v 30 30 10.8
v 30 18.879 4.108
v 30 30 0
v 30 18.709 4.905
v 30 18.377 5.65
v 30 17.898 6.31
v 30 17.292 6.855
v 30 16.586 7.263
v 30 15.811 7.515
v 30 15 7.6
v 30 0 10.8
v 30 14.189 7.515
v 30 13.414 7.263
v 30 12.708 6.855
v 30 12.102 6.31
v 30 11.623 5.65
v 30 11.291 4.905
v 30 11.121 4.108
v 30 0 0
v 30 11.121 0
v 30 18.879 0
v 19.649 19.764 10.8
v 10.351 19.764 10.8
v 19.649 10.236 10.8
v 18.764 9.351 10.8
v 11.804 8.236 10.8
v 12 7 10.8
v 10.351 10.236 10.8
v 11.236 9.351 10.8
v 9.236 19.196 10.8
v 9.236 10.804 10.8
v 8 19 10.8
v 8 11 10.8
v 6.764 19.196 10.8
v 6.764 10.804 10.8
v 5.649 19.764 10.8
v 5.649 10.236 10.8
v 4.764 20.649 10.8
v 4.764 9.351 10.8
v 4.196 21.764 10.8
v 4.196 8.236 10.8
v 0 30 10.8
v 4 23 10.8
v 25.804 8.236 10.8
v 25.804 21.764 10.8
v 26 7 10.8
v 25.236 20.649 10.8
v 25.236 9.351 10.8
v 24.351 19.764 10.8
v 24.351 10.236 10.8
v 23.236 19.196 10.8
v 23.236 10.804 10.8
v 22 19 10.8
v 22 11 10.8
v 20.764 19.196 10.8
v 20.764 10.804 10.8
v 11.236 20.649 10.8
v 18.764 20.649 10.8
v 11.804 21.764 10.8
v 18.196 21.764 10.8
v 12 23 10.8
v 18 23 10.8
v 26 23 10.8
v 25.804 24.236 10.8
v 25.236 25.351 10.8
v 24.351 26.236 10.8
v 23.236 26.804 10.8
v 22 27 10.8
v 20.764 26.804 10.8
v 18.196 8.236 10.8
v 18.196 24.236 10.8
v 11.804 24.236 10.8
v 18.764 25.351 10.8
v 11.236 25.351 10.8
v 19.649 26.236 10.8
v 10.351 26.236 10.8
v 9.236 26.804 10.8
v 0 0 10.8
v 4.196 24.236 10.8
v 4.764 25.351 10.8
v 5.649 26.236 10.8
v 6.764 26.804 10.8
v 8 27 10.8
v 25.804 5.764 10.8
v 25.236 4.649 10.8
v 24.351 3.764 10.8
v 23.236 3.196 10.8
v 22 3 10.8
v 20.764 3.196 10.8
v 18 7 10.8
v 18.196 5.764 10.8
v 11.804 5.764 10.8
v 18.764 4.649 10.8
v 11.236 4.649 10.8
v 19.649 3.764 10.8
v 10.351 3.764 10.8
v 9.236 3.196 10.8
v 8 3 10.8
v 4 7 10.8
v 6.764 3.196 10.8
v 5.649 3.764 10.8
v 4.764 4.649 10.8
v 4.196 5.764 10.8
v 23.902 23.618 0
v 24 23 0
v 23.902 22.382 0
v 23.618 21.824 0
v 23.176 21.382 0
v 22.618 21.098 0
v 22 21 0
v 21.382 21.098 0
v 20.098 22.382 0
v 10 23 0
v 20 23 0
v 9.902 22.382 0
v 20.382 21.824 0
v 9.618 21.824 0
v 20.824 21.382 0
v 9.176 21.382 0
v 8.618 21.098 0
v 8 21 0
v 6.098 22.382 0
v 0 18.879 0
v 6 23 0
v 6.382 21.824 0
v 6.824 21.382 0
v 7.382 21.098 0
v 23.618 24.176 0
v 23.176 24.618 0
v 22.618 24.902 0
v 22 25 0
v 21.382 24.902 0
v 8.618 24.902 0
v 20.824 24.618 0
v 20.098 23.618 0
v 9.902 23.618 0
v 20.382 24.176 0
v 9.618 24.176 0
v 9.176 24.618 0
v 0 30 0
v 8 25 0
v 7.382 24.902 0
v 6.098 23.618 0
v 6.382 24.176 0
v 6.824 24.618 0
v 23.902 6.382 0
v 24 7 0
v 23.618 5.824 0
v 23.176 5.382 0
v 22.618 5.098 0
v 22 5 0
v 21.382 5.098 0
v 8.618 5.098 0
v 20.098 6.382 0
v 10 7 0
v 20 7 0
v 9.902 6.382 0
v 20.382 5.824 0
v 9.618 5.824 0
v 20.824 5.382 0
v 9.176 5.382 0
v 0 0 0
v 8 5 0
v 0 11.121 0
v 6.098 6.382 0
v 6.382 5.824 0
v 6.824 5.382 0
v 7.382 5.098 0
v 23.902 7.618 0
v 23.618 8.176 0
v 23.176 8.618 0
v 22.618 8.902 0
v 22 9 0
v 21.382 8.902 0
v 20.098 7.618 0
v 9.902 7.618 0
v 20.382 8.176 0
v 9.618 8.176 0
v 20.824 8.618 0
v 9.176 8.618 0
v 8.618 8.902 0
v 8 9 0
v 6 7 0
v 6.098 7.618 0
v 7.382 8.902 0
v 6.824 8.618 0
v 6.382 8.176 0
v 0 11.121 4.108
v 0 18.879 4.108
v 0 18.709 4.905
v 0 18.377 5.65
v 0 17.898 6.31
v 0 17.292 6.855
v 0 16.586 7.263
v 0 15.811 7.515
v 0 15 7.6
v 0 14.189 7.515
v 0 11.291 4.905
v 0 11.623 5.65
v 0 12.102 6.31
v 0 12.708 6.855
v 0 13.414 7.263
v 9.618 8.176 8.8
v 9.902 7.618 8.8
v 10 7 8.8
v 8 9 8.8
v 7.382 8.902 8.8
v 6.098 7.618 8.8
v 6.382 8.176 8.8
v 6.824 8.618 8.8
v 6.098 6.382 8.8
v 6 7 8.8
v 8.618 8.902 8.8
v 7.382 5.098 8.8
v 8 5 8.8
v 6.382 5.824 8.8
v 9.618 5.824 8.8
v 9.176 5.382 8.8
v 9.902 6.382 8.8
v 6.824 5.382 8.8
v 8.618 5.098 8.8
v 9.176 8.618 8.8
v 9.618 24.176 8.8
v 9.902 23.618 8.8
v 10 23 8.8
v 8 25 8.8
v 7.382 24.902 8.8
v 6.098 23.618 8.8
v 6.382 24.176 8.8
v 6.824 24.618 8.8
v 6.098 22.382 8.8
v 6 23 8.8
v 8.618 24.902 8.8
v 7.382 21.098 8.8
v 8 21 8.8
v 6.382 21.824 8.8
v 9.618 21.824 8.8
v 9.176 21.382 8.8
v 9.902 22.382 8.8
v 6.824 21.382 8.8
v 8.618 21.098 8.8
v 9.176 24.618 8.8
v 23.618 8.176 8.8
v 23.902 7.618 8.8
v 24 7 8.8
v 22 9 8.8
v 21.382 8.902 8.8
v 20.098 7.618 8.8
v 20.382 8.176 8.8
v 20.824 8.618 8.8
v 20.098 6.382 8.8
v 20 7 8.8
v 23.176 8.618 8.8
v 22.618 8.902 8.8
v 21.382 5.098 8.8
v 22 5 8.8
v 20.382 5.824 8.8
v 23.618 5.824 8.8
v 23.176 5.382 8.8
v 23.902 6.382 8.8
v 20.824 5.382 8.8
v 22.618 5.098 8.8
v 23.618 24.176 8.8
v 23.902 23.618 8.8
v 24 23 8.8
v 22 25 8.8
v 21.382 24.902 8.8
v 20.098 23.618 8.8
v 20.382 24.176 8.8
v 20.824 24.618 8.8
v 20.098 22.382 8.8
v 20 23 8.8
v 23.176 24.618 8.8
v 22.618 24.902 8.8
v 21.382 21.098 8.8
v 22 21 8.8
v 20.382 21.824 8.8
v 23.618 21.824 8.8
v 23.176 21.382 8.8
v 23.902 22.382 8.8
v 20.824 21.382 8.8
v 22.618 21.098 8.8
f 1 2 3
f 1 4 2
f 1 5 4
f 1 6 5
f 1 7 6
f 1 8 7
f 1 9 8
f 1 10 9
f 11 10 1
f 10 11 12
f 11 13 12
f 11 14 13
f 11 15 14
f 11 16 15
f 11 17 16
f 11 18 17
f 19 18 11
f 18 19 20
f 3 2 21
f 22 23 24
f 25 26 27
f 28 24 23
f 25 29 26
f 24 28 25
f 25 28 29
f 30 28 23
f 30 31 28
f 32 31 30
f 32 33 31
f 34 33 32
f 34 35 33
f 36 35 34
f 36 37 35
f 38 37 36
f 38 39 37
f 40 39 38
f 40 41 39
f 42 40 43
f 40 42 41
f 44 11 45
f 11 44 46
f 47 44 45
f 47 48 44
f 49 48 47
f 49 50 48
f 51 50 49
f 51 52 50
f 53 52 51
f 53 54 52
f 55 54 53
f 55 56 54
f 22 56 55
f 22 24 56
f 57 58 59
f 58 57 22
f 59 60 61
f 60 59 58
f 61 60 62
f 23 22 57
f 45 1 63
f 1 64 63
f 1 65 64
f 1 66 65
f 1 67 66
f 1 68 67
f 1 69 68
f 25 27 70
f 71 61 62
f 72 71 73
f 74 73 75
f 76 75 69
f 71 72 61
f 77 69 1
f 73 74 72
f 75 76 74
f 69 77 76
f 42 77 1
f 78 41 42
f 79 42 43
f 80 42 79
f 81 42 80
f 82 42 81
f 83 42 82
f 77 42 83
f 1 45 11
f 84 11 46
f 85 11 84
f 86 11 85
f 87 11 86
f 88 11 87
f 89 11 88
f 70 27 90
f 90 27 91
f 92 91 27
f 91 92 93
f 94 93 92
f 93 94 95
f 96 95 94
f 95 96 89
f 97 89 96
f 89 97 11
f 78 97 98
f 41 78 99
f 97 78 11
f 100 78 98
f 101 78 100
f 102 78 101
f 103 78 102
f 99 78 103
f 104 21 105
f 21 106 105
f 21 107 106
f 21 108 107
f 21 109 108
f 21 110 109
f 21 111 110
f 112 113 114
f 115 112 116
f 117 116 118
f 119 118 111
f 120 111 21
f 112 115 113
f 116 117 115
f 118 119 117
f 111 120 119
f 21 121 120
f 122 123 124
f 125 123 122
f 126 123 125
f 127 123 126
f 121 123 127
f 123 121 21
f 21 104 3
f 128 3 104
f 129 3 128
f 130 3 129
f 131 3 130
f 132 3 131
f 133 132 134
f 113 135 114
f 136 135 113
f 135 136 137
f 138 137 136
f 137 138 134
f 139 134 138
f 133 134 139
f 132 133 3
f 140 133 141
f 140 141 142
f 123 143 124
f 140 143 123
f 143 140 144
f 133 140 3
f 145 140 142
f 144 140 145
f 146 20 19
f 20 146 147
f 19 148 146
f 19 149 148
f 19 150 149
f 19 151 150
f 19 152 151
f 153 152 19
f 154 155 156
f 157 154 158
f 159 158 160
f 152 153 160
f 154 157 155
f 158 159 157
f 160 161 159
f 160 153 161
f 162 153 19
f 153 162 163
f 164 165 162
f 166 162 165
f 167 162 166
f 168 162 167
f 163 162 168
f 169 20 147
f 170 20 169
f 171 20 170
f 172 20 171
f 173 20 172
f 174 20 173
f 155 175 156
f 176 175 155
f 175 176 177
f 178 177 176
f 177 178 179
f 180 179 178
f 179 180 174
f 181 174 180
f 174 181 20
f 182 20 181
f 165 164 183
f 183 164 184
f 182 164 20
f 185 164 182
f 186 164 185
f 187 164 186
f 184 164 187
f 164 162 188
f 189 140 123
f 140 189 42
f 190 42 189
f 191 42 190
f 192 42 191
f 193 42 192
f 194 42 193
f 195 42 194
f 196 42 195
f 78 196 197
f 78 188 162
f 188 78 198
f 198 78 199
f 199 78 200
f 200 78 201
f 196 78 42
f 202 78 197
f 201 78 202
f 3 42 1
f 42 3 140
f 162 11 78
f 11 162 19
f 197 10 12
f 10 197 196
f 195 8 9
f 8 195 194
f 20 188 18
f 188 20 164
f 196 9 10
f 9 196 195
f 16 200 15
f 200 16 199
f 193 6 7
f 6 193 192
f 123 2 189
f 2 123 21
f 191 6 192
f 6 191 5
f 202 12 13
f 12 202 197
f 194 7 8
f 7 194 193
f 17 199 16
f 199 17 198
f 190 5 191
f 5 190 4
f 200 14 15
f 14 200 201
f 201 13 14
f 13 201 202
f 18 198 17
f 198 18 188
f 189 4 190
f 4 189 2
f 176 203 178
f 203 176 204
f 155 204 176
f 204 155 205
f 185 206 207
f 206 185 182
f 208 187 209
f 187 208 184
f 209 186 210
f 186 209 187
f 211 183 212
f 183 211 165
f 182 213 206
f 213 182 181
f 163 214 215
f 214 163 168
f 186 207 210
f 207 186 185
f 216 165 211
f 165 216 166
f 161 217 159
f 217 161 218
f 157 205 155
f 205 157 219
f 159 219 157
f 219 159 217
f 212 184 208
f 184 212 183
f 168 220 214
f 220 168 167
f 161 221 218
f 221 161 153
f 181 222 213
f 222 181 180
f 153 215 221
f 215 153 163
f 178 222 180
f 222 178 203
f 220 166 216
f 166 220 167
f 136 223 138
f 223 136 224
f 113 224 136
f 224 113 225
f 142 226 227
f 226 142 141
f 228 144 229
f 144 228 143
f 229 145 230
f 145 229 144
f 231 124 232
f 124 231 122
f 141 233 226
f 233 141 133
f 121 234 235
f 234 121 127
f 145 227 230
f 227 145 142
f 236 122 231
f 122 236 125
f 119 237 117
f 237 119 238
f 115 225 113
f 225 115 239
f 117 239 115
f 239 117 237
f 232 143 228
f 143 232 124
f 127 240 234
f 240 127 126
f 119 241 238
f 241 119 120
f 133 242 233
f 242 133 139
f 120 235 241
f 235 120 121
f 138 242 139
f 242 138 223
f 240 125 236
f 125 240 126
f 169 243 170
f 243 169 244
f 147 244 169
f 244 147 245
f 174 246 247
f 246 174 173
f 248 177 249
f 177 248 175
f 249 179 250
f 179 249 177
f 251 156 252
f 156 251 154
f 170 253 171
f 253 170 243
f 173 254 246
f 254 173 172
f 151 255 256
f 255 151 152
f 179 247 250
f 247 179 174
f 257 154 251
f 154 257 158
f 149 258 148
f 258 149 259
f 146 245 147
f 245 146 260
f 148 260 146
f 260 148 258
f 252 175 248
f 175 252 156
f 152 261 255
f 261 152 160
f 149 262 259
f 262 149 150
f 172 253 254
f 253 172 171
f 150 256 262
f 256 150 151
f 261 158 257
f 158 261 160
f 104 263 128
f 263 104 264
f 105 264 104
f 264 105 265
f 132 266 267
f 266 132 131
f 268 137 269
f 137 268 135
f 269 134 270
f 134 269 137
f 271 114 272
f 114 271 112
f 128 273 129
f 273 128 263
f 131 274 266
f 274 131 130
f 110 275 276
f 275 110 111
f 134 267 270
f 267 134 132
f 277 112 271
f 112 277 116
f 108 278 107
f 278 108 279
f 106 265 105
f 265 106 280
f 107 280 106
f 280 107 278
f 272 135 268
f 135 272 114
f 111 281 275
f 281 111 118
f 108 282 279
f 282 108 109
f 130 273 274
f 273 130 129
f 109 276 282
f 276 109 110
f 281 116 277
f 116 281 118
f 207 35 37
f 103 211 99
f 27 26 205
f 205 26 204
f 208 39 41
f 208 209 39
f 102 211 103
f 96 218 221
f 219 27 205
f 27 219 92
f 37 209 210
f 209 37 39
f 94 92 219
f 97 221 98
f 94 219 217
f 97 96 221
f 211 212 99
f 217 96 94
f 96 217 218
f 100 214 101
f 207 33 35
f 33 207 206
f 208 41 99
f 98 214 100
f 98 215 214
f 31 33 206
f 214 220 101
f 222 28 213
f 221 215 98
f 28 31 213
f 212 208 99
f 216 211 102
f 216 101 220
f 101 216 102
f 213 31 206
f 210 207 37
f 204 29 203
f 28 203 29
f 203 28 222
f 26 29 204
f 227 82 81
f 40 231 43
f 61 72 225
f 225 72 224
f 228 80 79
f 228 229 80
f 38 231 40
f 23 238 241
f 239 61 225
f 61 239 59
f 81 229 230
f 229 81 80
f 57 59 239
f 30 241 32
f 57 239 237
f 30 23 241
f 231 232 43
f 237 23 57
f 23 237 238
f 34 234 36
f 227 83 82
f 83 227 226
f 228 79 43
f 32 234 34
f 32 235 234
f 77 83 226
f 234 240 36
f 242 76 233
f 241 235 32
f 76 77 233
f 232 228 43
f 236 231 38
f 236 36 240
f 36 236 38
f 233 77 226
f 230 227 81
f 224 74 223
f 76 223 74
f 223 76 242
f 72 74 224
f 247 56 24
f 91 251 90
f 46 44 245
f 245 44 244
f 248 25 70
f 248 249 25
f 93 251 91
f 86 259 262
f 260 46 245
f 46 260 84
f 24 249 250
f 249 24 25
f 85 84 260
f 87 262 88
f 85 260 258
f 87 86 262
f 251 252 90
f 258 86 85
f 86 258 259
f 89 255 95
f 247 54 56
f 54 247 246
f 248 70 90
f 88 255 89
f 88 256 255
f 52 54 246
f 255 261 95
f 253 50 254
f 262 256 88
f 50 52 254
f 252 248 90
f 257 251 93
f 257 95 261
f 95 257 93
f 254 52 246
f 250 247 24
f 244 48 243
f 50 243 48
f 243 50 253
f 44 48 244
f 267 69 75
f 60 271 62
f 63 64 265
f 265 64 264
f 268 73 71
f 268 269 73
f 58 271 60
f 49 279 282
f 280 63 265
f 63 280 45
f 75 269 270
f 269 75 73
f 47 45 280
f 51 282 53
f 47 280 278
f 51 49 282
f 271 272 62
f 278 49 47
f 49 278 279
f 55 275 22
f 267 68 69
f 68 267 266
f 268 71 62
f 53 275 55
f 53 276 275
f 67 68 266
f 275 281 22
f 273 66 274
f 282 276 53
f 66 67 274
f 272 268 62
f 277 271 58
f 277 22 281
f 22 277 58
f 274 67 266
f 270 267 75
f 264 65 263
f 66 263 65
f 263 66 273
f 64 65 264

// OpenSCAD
// Author: Mihai Oltean, https://mihaioltean.github.io, mihai.oltean@gmail.com
// More details: https://jenny5.org, https://jenny5-robot.github.io/
// Source code: github.com/jenny5-robot
// MIT License
//--------------------------------------------------------------

module shaft_housing(length, width, shaft_radius)
{
    difference(){
      cube([length, width, 2 * shaft_radius + 3]);
        // shaft hole
        hull(){
            translate ([0, width / 2, 0]) rotate([0, 90, 0]) cylinder(h = length, r = shaft_radius, $fn = 30);
            translate ([0, width / 2, shaft_radius - 0.2]) rotate([0, 90, 0]) cylinder(h = length, r = shaft_radius, $fn = 30);
        }
        
        // screw holes
        translate([8, width / 2 - 8, 0]) cylinder (h = 2 * shaft_radius + 3, r = 2, $fn = 20);
        translate([8, width / 2 + 8, 0]) cylinder (h = 2 * shaft_radius + 3, r = 2, $fn = 20);
        translate([length - 8, width / 2 - 8, 0]) cylinder (h = 2 * shaft_radius + 3, r = 2, $fn = 20);
        translate([length - 8, width / 2 + 8, 0]) cylinder (h = 2 * shaft_radius + 3, r = 2, $fn = 20);
        
        // head for sunken screw
        translate([8, width / 2 - 8, 2 * shaft_radius + 1]) cylinder (h = 2, r1 = 2, r2 = 4, $fn = 20);
        translate([8, width / 2 + 8, 2 * shaft_radius + 1]) cylinder (h = 2, r1 = 2, r2 = 4, $fn = 20);
        translate([length - 8, width / 2 - 8, 2 * shaft_radius + 1]) cylinder (h = 2, r1 = 2, r2 = 4, $fn = 20);
        translate([length - 8, width / 2 + 8, 2 * shaft_radius + 1]) cylinder (h = 2, r1 = 2, r2 = 4, $fn = 20);
        
    }
    
}

shaft_housing(length = 30, width = 30, shaft_radius = 3.9);
